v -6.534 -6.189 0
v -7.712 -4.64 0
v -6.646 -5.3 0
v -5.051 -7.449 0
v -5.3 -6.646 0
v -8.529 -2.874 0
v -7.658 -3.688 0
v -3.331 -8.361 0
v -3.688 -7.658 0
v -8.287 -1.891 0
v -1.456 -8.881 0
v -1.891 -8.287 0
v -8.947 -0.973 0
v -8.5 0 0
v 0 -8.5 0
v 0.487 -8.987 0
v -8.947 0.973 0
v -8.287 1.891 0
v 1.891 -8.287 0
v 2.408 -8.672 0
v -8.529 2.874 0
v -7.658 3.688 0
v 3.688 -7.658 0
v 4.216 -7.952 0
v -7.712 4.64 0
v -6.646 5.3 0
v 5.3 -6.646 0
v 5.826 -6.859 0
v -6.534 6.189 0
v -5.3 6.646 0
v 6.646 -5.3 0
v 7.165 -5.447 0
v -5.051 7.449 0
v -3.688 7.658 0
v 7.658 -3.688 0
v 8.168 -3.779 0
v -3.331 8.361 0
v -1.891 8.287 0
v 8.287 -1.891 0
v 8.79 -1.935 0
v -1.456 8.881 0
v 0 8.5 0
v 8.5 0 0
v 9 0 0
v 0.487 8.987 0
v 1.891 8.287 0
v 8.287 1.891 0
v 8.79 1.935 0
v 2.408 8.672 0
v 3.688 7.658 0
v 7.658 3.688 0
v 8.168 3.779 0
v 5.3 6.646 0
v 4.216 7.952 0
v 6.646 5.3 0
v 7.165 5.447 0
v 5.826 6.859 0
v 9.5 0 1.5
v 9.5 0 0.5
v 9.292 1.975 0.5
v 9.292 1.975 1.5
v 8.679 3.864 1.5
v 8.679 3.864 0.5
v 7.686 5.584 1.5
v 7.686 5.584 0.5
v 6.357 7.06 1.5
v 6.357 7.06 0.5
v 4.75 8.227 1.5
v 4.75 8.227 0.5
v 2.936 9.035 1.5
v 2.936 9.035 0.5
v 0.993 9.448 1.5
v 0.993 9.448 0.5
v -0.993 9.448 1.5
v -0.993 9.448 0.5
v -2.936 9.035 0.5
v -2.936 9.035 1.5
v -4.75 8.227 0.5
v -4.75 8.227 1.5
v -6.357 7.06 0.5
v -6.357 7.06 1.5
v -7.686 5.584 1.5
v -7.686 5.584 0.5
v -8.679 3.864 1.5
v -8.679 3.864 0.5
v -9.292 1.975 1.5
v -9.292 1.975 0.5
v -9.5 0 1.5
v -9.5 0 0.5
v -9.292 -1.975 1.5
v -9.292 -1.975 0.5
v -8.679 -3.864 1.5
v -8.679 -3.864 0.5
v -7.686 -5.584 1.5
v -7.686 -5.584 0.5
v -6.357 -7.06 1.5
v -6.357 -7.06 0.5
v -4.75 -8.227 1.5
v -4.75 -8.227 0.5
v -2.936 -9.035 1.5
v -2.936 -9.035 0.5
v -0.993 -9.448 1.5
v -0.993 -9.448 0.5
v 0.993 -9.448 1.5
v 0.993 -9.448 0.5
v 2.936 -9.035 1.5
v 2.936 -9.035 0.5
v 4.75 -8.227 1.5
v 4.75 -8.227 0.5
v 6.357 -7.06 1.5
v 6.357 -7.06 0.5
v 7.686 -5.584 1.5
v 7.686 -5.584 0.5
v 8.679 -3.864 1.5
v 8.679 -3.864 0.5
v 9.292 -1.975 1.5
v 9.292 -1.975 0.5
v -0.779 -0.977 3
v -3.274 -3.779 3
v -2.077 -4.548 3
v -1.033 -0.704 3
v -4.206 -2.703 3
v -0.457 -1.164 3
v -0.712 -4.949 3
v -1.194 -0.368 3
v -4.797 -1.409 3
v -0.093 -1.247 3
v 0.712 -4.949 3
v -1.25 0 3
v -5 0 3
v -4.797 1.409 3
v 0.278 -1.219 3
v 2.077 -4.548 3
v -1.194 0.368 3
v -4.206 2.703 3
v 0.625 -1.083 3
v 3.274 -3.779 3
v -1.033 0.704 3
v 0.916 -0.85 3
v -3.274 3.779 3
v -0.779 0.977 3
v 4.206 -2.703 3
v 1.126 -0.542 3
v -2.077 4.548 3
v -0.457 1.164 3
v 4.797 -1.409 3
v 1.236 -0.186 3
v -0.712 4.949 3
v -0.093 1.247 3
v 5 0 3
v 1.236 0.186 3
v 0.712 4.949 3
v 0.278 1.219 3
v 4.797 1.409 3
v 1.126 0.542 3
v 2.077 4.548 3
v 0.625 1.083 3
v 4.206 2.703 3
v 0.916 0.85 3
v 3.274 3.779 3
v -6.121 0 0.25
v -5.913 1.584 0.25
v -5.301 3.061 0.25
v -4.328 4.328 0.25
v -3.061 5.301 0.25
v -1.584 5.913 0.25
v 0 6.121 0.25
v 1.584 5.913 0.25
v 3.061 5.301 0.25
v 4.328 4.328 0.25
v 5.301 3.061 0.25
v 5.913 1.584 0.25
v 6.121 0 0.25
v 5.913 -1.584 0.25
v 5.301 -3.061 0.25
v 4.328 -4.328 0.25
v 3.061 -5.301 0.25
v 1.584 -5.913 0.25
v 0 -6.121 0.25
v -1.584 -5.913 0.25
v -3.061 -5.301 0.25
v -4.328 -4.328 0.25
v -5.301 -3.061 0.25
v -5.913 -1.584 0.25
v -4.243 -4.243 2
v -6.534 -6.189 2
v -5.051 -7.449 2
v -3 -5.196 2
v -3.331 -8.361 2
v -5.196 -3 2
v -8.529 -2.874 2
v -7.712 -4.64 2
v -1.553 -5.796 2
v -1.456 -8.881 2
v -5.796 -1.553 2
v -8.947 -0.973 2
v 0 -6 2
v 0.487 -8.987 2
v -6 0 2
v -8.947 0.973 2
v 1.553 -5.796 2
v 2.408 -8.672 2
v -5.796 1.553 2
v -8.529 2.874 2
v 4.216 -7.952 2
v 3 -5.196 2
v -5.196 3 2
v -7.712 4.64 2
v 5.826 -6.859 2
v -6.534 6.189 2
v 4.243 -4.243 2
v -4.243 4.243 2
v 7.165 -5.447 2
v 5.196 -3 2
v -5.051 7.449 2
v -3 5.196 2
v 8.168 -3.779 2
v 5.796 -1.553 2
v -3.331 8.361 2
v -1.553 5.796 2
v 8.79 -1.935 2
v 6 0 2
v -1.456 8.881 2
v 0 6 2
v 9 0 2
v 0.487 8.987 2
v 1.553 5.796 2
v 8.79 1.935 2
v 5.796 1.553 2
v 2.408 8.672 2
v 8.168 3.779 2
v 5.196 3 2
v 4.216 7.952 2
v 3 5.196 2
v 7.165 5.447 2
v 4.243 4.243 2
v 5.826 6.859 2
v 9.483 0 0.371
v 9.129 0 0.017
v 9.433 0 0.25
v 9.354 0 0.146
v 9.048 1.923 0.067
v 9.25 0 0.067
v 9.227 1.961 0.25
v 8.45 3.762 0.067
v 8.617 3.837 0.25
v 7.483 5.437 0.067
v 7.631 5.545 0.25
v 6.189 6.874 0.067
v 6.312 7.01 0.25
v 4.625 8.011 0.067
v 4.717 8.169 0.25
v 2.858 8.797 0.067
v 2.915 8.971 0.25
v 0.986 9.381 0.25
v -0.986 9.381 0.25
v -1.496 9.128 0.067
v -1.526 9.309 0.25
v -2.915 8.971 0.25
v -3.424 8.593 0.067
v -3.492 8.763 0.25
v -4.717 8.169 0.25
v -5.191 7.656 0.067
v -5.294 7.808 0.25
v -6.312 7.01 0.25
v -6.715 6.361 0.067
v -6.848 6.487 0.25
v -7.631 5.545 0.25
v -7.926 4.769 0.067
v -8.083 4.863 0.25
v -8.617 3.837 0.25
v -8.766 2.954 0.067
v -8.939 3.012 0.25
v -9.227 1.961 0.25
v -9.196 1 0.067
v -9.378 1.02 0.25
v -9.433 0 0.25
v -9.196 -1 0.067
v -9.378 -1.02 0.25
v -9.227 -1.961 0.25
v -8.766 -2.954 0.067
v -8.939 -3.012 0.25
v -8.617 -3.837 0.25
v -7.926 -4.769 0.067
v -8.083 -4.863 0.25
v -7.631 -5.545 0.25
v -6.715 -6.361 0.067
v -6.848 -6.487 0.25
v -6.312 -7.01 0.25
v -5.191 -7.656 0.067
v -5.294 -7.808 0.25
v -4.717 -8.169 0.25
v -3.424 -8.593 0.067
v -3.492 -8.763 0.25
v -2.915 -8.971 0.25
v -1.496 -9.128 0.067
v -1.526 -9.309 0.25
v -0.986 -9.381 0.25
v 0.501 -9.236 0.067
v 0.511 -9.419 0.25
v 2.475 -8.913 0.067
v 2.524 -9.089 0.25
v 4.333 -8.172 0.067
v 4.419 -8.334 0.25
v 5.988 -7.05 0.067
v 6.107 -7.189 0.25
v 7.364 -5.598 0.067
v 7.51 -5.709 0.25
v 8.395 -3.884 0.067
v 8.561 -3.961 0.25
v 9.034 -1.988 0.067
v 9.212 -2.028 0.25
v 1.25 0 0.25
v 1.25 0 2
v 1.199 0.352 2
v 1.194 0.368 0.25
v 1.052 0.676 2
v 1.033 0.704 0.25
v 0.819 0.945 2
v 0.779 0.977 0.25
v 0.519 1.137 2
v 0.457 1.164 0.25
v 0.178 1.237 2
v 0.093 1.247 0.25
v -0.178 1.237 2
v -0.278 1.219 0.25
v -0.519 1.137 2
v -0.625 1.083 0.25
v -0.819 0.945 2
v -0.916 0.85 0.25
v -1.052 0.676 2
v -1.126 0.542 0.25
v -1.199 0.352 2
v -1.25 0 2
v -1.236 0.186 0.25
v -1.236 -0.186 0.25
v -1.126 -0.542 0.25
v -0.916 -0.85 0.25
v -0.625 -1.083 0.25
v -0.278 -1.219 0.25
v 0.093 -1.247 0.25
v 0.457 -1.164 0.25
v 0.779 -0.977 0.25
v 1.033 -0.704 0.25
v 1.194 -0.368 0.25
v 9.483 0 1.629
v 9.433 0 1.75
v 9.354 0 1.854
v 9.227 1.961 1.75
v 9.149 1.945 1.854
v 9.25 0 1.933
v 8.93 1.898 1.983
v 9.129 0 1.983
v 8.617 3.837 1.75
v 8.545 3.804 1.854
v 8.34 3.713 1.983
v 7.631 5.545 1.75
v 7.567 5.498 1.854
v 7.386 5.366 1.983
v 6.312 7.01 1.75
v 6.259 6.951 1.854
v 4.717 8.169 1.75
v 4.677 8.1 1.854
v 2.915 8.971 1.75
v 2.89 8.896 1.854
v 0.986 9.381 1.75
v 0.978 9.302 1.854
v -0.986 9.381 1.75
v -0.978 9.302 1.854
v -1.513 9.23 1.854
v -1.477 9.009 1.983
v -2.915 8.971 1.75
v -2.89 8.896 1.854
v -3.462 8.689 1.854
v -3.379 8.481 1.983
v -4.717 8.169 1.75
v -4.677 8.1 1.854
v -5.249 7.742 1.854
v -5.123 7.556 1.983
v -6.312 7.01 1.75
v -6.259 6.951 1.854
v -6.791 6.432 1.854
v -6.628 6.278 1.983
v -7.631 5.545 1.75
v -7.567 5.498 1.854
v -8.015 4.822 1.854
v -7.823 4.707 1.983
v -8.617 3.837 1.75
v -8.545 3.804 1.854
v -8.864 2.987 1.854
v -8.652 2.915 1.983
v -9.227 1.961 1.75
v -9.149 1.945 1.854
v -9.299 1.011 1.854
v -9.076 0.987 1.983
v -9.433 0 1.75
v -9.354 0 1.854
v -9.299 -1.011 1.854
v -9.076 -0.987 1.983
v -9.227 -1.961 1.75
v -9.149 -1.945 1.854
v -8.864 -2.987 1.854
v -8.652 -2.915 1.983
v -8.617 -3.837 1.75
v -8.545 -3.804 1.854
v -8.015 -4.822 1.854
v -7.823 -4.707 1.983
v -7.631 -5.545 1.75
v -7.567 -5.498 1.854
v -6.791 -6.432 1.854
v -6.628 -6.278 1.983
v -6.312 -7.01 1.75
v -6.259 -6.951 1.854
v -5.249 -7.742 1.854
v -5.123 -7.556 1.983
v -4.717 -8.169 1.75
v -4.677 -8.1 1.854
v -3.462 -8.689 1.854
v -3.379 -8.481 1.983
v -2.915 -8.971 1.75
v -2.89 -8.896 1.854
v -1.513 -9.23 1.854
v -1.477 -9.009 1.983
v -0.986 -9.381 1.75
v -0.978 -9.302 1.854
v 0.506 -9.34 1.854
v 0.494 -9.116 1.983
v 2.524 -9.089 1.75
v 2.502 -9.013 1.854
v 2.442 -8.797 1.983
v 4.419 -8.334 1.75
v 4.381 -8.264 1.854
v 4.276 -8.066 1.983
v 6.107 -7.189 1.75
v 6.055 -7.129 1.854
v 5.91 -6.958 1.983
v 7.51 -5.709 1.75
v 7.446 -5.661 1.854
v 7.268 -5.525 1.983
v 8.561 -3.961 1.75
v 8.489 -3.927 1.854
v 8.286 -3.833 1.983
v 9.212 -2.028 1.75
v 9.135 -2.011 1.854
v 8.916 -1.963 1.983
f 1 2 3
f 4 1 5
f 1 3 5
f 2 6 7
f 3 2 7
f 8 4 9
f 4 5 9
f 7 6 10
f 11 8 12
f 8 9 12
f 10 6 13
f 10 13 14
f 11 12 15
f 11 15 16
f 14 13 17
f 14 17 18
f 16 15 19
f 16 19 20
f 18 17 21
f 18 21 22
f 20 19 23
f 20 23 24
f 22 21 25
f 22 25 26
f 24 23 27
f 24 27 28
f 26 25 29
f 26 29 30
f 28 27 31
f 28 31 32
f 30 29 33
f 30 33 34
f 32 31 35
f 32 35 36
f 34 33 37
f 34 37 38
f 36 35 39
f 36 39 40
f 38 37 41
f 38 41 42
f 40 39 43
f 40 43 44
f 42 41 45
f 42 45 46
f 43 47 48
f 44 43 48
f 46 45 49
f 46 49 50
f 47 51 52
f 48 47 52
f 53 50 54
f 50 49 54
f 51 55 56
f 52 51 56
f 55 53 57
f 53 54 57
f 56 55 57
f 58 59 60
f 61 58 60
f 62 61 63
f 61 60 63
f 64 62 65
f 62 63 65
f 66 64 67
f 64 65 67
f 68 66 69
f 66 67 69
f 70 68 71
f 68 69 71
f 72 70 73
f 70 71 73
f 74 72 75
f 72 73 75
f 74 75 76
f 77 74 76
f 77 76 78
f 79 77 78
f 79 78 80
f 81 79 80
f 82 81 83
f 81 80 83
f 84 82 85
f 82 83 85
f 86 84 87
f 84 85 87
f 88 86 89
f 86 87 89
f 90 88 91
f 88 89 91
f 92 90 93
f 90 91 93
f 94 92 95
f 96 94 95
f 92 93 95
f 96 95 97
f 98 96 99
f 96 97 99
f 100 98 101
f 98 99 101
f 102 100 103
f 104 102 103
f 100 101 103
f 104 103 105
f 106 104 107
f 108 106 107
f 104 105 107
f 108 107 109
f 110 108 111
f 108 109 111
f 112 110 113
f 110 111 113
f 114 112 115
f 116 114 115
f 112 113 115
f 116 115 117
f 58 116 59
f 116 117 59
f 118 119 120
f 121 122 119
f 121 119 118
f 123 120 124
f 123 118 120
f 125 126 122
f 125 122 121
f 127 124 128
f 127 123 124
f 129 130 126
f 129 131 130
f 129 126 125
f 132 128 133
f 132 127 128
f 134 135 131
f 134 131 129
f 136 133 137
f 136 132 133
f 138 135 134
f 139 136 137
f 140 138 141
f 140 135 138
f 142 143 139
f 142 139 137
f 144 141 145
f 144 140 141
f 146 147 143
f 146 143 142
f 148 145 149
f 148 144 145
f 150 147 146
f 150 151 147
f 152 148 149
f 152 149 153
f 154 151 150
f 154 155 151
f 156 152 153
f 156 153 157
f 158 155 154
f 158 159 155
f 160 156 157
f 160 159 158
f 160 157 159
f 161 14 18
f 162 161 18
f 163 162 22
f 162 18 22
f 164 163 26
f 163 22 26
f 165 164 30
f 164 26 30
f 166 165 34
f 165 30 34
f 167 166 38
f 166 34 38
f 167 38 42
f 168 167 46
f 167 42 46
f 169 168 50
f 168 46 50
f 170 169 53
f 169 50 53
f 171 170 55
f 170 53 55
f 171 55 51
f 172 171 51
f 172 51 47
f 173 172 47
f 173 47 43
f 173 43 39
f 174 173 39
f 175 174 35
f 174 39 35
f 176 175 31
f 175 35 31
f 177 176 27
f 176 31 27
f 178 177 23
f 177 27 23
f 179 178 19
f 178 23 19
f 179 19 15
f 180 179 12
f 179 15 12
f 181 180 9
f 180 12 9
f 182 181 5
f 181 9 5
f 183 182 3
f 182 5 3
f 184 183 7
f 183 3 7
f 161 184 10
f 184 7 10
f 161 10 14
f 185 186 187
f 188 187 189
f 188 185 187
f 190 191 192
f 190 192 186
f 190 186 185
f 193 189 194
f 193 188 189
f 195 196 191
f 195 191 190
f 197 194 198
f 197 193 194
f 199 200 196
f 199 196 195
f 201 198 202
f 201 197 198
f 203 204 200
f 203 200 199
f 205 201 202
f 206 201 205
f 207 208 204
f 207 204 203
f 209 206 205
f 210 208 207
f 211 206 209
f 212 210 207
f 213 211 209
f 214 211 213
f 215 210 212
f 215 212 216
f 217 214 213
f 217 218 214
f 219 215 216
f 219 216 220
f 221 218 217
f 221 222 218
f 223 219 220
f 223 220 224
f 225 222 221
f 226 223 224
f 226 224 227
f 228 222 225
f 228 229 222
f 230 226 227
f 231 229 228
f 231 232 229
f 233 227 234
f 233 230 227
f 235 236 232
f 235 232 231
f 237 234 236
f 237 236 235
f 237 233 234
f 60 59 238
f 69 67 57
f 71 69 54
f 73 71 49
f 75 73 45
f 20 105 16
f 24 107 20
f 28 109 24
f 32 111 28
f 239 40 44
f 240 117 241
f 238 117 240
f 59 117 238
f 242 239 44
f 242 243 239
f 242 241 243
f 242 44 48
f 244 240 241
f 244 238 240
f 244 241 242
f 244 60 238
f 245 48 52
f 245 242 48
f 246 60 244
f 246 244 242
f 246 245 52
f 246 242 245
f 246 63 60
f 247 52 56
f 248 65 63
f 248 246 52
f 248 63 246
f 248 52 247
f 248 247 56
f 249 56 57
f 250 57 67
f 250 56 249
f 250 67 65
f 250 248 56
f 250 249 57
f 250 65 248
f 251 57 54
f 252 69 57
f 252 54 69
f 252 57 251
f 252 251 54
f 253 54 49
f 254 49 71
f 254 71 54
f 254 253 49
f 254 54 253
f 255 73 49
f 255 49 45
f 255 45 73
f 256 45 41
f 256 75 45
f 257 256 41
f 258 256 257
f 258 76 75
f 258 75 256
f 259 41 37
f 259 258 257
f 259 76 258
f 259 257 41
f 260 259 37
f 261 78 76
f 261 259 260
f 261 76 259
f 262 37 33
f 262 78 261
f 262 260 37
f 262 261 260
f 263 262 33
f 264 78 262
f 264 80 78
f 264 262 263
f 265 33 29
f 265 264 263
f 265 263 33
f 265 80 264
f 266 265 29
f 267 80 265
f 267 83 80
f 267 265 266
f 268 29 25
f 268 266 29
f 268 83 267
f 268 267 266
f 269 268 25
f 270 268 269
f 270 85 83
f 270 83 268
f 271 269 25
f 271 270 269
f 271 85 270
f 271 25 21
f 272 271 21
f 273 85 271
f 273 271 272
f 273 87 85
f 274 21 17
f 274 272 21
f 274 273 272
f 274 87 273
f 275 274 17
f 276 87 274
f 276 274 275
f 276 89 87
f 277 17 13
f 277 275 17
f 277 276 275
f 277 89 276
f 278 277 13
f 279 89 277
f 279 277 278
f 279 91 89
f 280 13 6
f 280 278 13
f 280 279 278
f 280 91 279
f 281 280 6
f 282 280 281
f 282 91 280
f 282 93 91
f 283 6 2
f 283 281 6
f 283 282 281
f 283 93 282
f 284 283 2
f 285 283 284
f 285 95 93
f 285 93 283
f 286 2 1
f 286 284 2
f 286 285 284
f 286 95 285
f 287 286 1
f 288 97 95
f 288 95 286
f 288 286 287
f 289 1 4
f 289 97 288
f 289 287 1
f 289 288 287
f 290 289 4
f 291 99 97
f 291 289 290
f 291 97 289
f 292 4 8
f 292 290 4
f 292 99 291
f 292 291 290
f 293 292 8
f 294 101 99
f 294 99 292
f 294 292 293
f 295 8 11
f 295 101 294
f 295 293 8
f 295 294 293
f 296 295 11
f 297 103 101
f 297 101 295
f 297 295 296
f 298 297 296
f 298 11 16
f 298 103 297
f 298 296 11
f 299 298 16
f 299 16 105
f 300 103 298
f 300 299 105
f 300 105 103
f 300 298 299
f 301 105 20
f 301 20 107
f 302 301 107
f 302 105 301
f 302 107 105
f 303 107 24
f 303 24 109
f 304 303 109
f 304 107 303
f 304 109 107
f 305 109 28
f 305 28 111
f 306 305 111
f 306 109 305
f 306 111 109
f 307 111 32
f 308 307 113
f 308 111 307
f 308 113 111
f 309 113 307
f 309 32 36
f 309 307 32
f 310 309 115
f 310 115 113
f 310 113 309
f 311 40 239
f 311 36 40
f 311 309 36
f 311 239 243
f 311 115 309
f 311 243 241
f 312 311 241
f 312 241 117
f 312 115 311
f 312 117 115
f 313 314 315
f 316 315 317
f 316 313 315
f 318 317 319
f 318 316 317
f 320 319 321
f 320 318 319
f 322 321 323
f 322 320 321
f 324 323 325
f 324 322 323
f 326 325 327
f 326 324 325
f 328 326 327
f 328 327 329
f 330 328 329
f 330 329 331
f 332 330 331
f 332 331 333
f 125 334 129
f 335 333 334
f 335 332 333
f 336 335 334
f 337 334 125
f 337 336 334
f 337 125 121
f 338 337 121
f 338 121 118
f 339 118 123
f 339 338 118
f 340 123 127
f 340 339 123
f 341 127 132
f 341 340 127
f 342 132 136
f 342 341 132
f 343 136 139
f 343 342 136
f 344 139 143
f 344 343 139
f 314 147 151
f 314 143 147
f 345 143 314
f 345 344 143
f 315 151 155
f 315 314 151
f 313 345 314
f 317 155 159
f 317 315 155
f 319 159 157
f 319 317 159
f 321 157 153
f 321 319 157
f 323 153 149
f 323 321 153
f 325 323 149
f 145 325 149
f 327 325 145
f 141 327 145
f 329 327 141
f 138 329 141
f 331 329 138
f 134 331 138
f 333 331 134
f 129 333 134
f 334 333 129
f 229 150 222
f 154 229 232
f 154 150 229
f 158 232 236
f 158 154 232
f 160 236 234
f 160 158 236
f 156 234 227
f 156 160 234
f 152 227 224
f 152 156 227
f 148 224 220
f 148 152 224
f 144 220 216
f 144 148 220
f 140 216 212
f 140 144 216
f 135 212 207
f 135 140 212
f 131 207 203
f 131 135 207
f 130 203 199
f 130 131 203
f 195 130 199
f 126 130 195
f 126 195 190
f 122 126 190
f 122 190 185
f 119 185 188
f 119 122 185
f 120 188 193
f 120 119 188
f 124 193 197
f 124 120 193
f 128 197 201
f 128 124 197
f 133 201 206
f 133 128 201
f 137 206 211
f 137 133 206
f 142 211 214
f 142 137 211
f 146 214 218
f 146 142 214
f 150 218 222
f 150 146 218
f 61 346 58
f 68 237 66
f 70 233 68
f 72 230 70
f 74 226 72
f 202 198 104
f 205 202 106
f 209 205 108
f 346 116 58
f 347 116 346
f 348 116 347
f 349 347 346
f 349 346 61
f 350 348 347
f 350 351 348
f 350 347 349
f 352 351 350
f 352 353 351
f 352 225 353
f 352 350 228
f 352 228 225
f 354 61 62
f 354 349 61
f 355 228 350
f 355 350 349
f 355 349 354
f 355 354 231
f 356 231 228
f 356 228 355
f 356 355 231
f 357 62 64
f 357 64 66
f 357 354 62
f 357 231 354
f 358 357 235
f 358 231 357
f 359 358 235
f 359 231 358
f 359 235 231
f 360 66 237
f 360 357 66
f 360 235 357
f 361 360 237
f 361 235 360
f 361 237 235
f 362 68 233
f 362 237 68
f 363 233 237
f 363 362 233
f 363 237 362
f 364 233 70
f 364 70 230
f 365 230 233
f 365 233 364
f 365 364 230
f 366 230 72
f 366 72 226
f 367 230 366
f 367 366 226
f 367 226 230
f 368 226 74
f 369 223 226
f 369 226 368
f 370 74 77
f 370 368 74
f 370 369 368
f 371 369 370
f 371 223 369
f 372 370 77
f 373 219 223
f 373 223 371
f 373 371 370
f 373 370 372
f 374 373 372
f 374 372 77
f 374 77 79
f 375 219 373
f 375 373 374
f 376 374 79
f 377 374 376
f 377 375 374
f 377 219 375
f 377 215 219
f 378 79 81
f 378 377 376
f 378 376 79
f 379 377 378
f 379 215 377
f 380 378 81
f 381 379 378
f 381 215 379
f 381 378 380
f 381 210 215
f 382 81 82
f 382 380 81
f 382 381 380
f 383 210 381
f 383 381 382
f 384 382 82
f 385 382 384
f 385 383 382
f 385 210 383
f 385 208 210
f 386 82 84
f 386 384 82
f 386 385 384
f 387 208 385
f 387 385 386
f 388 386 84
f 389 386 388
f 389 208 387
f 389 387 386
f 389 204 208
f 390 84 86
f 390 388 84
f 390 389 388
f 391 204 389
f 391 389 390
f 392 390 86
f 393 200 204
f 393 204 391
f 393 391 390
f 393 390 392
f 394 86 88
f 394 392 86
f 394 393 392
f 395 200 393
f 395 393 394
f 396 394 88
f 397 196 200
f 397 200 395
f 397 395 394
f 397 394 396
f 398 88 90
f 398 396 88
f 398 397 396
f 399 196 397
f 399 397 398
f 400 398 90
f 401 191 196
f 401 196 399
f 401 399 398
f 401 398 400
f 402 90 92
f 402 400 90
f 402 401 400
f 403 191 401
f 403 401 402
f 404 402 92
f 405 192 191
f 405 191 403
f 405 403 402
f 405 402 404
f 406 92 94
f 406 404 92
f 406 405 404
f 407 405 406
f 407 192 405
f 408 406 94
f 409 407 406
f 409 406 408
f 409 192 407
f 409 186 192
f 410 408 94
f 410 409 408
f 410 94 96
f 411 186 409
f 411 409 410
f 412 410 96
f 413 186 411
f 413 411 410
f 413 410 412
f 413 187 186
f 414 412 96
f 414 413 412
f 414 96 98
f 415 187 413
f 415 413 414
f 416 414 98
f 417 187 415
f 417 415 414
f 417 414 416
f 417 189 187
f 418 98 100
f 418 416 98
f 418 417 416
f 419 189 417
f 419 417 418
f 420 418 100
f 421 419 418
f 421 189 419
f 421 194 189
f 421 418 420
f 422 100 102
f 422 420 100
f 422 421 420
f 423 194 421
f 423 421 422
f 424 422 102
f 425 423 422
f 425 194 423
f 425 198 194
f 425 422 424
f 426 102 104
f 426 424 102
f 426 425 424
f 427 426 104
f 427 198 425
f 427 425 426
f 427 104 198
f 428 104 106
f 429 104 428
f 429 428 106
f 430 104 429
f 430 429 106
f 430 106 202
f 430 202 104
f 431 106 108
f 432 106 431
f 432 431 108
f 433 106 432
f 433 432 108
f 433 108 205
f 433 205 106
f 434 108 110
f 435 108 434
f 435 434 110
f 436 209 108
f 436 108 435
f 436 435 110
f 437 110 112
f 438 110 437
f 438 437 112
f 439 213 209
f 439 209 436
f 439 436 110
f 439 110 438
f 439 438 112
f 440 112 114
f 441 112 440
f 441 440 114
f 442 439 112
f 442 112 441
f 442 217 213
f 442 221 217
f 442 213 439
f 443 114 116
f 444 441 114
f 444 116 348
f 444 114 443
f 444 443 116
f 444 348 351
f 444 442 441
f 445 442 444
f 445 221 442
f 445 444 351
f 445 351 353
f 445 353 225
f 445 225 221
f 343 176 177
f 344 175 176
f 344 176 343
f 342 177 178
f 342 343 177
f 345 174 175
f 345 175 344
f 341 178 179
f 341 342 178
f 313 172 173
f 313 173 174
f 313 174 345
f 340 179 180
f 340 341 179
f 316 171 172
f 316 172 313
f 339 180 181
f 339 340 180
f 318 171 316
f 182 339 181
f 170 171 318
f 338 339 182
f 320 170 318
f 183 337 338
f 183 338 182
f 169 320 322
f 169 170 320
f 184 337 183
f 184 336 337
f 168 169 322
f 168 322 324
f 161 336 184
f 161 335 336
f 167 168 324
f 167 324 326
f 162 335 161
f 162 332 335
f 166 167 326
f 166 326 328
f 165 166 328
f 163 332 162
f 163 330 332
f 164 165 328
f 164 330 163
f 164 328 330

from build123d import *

# Parameters (mm, degrees)
SKETCH1_R           = 9.5
SKETCH1_R_2         = 6
SKETCH1_R_3         = 1.25
BOSS_EXTRUDE1_DEPTH = 2
BOSS_EXTRUDE2_START = 2
SKETCH1_3_R         = 6
BOSS_EXTRUDE2_DEPTH = 1
BOSS_EXTRUDE2_TAPER = 45
SKETCH2_R           = 8.5
CUT_EXTRUDE1_DEPTH  = 0.25
CUT_EXTRUDE1_DRAFT  = -84
SKETCH1_4_R         = 1.25
CUT_EXTRUDE2_DEPTH  = 40.25
FILLET1_R           = 0.5


with BuildPart() as part:
    # Sketch1 → Boss-Extrude1 (new body)
    # profile 1 of 2: a face of its own
    with BuildSketch(Plane.XY):
        Circle(SKETCH1_R)
        Circle(SKETCH1_R_2, mode=Mode.SUBTRACT)
    # profile 2 of 2: a face of its own
    with BuildSketch(Plane.XY):
        Circle(SKETCH1_R_2)
        Circle(SKETCH1_R_3, mode=Mode.SUBTRACT)
    extrude(amount=BOSS_EXTRUDE1_DEPTH)

    # Sketch1<3> → Boss-Extrude2 (add)
    with BuildSketch(Plane.XY.offset(BOSS_EXTRUDE2_START)):
        Circle(SKETCH1_3_R)
    extrude(amount=BOSS_EXTRUDE2_DEPTH, taper=BOSS_EXTRUDE2_TAPER)


with BuildPart() as cut_extrude1_tool:
    # Sketch2 → Cut-Extrude1 (with draft: the straight prism first)
    with BuildSketch(Plane(origin=(0, 0, 0), x_dir=(-1, 0, 0), z_dir=(0, 0, -1))):
        Circle(SKETCH2_R)
    extrude(amount=-CUT_EXTRUDE1_DEPTH)
    # Cut-Extrude1: the draft: its side faces are tilted about the plane it starts from
    cut_extrude1_sides = [cut_extrude1_tool.faces().sort_by_distance(p)[0] for p in [
        (8.5, 0, 0.125),
    ]]
    draft(cut_extrude1_sides, Plane(origin=(0, 0, 0), x_dir=(-1, 0, 0), z_dir=(0, 0, -1)), CUT_EXTRUDE1_DRAFT)


with BuildPart() as part_1:
    add(part.part)

    # Cut-Extrude1: cut by cut_extrude1_tool
    add(cut_extrude1_tool.part, mode=Mode.SUBTRACT)

    # Sketch1<4> → Cut-Extrude2 (cut)
    with BuildSketch(Plane.XY):
        with Locations(Location((0, 0, 0), (0, 0, 180))):
            Circle(SKETCH1_4_R)
    extrude(amount=CUT_EXTRUDE2_DEPTH, mode=Mode.SUBTRACT)

    # Fillet1
    fillet1_edges = [part_1.edges().sort_by_distance(p)[0] for p in [
        (-9.5, 0, 0),
        (-9.5, 0, 2),
    ]]
    fillet(fillet1_edges, radius=FILLET1_R)


solid = part_1.part
